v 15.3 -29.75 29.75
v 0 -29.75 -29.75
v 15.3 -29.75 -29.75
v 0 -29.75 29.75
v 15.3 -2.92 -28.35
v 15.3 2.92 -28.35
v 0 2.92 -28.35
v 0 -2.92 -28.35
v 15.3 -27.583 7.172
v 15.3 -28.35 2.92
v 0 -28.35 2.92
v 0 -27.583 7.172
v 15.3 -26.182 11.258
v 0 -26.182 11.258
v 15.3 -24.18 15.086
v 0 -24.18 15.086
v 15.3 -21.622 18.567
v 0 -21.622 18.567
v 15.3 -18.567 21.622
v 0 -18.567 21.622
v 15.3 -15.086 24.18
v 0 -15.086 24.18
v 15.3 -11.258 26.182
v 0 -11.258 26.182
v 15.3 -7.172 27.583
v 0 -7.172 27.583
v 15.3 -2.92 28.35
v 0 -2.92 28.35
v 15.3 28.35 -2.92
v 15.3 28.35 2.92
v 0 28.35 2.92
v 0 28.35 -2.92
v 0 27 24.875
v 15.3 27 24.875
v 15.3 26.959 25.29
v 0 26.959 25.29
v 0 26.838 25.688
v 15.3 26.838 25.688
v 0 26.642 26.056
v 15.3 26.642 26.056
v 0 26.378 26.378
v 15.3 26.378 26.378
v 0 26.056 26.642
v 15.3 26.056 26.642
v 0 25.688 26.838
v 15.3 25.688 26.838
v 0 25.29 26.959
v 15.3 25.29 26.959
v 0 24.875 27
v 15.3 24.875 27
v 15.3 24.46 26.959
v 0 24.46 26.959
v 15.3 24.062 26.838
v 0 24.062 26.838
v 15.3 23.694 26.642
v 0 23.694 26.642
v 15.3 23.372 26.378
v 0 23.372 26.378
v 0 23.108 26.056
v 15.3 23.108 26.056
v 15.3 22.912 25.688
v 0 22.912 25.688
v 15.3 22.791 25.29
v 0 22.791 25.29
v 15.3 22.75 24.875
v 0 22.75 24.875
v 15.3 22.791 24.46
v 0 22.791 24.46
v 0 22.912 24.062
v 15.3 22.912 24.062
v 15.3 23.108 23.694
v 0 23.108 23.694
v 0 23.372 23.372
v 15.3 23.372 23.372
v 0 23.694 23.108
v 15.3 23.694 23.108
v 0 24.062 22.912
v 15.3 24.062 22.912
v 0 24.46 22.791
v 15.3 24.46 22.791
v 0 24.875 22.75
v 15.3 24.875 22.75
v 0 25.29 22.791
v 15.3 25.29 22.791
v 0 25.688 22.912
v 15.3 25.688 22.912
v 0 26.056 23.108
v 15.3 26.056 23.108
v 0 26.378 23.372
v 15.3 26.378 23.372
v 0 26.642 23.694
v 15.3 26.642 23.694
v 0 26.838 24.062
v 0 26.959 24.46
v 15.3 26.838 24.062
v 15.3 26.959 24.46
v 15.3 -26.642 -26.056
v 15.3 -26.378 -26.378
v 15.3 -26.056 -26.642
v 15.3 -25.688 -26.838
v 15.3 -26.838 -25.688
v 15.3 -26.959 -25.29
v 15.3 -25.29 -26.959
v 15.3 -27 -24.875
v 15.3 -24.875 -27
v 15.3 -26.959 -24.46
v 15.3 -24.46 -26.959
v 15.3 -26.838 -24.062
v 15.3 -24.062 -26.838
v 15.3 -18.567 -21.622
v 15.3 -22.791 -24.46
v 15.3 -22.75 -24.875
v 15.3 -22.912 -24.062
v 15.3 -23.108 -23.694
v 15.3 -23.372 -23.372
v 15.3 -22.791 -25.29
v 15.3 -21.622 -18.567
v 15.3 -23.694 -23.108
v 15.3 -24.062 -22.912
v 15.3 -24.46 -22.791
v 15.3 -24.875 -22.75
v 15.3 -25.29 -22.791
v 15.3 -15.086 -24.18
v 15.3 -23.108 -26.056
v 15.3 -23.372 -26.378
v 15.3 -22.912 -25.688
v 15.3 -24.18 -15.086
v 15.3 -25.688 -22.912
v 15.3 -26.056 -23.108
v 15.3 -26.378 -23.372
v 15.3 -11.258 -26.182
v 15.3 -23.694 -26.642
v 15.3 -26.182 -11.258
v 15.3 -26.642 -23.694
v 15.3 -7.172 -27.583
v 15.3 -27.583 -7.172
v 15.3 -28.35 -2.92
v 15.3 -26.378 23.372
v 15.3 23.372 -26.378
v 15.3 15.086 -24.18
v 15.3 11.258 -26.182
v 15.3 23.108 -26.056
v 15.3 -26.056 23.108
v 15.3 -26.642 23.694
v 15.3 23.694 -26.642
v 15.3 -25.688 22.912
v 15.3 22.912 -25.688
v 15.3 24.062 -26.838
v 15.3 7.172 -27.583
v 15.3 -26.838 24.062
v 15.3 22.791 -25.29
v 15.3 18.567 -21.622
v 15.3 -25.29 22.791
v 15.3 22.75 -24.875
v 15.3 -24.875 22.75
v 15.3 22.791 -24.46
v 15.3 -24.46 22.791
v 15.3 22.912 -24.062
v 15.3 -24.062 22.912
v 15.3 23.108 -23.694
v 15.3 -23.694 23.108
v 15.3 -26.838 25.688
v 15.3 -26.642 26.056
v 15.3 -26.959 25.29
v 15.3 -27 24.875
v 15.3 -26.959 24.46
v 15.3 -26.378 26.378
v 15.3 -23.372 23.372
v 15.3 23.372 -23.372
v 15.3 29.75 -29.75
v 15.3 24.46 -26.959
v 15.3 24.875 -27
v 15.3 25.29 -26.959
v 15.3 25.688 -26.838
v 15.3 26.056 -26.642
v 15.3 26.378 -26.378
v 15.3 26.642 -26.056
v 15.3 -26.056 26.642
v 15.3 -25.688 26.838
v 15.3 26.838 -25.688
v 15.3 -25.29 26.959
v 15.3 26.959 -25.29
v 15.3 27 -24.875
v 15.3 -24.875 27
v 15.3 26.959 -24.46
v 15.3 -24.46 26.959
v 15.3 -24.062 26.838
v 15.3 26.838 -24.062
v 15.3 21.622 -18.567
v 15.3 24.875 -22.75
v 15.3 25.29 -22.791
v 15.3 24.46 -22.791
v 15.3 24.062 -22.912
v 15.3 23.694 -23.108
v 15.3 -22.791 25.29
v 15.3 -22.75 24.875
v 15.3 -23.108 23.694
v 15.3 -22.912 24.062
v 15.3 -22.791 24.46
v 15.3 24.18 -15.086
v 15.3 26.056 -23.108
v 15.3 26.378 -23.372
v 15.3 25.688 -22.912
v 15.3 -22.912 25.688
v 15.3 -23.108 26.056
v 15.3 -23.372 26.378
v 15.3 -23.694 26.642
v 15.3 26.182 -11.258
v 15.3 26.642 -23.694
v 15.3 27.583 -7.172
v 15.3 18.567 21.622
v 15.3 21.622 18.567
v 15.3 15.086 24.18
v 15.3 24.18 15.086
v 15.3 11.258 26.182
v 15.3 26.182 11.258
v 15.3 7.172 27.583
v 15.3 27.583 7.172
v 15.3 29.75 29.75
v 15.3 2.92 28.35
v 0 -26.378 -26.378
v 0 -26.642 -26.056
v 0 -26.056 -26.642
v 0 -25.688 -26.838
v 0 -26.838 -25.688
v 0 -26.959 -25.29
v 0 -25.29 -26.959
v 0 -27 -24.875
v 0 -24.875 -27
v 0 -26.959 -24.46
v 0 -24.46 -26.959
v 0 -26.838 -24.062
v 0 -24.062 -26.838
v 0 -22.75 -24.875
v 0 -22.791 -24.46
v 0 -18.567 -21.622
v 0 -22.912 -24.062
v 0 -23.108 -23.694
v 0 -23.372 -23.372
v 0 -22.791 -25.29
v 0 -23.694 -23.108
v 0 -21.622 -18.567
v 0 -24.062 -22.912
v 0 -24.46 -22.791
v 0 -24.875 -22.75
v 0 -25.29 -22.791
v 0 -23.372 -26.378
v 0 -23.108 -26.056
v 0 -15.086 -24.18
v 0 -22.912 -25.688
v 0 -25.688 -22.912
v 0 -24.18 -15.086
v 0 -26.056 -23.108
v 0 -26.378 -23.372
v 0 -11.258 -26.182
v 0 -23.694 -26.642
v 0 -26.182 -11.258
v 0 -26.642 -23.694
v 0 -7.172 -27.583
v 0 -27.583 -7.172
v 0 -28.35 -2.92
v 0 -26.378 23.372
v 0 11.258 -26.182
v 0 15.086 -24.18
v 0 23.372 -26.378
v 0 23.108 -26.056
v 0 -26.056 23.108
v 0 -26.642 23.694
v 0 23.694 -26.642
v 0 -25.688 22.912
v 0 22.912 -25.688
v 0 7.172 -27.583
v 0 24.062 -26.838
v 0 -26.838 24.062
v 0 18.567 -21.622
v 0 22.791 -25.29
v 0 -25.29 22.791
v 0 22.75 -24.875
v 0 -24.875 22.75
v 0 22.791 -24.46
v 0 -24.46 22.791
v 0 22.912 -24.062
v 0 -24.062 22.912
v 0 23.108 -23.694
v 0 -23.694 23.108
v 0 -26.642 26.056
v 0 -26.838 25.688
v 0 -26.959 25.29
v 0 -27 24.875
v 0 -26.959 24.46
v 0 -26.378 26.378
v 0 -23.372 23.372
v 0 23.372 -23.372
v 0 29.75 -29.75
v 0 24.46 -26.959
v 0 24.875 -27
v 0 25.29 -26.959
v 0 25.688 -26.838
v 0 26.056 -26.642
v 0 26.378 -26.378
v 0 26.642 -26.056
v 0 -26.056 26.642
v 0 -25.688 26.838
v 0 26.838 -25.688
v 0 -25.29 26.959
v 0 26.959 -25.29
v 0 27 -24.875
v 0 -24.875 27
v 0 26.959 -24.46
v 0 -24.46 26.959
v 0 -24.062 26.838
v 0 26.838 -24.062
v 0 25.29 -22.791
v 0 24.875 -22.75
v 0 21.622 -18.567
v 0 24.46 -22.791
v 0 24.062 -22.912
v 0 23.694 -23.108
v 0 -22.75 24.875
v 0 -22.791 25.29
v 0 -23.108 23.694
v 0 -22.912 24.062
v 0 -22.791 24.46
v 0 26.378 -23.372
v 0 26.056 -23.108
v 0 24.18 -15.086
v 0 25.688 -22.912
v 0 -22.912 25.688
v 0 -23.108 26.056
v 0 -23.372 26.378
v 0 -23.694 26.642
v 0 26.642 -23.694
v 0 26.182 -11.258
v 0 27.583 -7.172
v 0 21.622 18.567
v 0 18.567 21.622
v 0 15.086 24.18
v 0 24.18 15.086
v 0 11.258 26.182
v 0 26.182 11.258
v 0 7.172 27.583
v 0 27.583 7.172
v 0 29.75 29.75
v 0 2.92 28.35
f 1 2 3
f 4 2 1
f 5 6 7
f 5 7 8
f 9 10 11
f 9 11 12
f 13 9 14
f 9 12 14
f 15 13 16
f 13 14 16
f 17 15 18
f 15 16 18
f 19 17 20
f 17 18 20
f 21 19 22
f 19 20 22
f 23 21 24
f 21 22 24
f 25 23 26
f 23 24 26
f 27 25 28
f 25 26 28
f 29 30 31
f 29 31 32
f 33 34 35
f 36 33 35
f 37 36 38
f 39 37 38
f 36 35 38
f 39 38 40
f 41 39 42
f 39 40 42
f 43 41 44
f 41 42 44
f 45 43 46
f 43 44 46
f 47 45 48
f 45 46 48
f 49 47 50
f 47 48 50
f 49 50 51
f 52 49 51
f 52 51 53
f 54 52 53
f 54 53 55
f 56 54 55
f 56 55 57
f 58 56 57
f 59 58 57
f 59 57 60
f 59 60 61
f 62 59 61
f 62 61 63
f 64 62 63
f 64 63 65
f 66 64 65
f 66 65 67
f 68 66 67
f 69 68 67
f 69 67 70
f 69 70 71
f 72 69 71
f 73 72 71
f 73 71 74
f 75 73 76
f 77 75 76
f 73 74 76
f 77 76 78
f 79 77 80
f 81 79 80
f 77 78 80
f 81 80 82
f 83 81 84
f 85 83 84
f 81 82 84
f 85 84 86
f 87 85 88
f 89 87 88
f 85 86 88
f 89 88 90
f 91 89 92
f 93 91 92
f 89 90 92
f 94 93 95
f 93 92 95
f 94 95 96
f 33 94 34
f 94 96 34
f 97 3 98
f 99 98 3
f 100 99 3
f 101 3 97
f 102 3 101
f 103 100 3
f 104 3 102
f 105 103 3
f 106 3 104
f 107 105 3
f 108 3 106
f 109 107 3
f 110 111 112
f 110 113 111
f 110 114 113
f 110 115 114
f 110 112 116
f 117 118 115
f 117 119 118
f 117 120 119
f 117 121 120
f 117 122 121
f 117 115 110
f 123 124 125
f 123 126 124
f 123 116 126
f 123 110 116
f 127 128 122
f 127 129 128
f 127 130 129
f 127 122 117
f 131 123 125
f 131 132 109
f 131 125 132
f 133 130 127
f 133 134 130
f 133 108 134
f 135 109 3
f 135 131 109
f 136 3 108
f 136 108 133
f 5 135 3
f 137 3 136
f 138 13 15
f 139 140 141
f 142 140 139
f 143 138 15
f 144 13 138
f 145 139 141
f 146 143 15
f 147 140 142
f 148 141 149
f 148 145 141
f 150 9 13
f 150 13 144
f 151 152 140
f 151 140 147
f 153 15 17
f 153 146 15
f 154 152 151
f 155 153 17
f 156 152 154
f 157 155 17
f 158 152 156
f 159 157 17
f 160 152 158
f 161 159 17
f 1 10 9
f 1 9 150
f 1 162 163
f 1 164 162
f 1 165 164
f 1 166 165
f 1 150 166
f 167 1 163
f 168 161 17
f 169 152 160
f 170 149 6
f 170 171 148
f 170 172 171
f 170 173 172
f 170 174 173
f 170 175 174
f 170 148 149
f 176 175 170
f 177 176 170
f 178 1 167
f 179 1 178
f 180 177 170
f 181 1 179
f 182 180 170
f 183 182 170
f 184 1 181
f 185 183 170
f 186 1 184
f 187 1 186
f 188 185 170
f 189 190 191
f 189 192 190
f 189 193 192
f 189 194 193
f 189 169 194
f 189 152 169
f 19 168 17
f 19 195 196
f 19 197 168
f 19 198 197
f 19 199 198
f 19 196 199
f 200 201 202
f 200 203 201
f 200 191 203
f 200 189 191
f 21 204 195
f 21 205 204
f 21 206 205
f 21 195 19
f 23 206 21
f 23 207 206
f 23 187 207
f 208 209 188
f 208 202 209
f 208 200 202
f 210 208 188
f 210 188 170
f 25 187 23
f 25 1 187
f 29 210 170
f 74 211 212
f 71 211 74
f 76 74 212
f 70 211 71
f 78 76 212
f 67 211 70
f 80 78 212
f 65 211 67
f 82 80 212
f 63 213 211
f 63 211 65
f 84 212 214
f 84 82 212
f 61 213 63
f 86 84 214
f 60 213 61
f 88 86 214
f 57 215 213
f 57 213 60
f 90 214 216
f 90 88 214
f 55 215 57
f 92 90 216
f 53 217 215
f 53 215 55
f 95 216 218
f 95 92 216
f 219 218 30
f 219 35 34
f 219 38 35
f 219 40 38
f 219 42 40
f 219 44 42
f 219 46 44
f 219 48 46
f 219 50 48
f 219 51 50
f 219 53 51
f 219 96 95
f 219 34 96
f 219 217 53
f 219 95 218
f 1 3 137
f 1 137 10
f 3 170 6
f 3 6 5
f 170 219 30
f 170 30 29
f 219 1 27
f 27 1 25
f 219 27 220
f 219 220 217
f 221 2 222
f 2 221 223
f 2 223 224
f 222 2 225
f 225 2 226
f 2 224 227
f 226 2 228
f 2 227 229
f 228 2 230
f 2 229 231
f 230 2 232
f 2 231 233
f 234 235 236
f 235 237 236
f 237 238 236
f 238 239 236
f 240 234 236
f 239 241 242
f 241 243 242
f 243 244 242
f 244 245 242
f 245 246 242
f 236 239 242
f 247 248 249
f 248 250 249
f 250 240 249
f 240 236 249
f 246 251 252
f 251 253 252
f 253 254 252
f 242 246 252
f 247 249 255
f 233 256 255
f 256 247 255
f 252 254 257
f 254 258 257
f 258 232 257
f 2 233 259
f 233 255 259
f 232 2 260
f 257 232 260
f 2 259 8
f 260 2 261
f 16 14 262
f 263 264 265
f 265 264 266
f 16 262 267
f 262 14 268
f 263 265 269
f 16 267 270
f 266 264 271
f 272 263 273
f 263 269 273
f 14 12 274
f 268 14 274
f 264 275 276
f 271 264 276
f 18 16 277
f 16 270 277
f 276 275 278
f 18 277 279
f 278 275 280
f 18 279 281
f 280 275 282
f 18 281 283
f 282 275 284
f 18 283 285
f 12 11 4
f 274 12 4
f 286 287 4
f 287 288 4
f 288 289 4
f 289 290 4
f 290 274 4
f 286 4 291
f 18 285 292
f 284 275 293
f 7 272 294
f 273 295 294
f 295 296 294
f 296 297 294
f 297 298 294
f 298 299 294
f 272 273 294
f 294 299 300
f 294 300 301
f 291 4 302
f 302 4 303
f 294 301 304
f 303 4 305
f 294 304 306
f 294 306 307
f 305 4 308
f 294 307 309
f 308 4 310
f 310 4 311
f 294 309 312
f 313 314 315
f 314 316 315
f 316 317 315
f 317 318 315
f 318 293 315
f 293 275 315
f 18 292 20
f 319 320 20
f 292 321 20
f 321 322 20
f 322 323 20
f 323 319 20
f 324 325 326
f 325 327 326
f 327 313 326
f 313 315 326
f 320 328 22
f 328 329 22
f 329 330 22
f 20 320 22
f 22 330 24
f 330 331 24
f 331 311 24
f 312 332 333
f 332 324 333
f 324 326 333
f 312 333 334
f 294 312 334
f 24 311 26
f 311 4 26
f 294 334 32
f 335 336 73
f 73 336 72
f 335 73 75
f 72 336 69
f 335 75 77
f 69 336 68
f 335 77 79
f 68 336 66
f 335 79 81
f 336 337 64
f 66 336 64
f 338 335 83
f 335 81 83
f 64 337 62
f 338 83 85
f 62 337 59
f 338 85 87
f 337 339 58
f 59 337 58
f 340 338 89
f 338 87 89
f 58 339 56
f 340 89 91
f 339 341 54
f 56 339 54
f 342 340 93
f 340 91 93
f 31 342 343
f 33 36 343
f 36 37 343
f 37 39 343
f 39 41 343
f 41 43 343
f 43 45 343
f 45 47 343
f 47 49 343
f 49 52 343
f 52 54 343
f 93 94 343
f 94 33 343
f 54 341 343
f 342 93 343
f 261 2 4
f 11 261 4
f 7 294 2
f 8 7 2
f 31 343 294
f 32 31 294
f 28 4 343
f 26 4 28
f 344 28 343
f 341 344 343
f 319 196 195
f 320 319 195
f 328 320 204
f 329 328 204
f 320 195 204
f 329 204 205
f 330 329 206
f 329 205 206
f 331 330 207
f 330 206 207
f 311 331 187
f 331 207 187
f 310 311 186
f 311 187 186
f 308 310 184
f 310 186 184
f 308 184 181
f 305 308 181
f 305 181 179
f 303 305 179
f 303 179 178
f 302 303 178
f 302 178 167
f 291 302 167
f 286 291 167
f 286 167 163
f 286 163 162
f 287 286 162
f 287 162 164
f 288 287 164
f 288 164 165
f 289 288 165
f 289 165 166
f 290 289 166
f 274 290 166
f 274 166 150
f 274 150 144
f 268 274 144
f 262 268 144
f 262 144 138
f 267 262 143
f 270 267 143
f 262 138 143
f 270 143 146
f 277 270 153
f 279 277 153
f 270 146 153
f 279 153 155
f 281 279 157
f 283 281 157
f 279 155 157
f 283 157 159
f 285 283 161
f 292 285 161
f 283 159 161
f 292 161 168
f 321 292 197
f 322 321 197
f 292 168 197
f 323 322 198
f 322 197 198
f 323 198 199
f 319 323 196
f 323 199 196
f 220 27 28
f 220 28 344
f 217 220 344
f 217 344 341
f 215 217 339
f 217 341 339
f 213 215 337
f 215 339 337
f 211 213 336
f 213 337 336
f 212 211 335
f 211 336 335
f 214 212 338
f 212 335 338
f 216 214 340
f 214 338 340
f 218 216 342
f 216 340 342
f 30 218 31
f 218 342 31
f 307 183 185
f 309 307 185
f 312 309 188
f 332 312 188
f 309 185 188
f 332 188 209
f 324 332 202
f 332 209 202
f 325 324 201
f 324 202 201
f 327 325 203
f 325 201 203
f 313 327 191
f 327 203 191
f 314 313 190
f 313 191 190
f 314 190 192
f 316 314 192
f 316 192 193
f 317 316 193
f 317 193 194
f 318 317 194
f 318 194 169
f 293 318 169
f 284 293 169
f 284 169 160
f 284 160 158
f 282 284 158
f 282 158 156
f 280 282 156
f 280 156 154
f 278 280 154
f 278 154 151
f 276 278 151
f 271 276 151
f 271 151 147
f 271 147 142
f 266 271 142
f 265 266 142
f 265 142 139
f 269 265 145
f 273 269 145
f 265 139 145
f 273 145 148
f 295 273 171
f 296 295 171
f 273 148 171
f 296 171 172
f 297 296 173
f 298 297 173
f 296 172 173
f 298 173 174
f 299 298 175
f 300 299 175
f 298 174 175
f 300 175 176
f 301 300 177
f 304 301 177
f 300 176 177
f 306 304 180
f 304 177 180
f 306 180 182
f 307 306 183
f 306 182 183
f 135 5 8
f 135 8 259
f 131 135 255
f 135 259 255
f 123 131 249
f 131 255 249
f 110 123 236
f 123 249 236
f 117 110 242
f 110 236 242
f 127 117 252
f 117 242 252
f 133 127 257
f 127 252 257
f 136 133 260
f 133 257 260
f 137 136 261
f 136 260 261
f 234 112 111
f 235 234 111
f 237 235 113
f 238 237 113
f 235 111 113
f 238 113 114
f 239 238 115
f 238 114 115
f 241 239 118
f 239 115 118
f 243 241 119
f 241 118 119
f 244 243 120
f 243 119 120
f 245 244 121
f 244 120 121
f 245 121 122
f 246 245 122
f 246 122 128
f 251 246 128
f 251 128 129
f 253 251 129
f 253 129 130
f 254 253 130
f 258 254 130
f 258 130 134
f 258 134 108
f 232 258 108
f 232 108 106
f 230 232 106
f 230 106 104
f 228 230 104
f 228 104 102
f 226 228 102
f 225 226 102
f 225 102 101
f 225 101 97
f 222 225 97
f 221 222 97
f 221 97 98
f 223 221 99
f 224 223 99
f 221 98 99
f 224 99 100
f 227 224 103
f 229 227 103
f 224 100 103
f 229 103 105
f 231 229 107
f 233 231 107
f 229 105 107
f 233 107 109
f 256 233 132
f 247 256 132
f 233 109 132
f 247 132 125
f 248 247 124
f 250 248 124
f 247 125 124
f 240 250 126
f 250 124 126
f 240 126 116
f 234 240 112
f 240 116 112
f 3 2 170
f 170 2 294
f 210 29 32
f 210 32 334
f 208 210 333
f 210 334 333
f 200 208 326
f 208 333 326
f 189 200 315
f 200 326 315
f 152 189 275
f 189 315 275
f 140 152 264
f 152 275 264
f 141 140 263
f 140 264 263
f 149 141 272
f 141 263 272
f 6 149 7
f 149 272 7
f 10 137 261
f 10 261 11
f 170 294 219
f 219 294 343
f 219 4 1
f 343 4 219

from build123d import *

# Parameters (mm, degrees)
F0_W     = 59.5
F0_H     = 59.5
F1_DEPTH = 15.3
F2_R     = 2.125
F3_DEPTH = 25


with BuildPart() as f1:
    # F0 (on Right) → F1 (new body)
    with BuildSketch(Plane.YZ):
        Rectangle(F0_W, F0_H)
        with BuildLine():
            ThreePointArc((-2.920188, -28.35), (-20.152543, -20.152543), (-28.35, -2.920188))
            Line((-28.35, -2.920188), (-28.35, 2.920188))
            ThreePointArc((-28.35, 2.920188), (-20.152543, 20.152543), (-2.920188, 28.35))
            Line((-2.920188, 28.35), (2.920188, 28.35))
            ThreePointArc((2.920188, 28.35), (20.152543, 20.152543), (28.35, 2.920188))
            Line((28.35, 2.920188), (28.35, -2.920188))
            ThreePointArc((28.35, -2.920188), (20.152543, -20.152543), (2.920188, -28.35))
            Line((2.920188, -28.35), (-2.920188, -28.35))
        make_face(mode=Mode.SUBTRACT)
    extrude(amount=F1_DEPTH)

    # F2 (on face) → F3 (cut)
    with BuildSketch(Plane.YZ.offset(15.3)):
        with Locations((-24.875, 24.875)):
            Circle(F2_R)
        with Locations((24.875, 24.875)):
            Circle(F2_R)
        with Locations((24.875, -24.875)):
            Circle(F2_R)
        with Locations((-24.875, -24.875)):
            Circle(F2_R)
    extrude(amount=-F3_DEPTH, mode=Mode.SUBTRACT)


solid = f1.part
